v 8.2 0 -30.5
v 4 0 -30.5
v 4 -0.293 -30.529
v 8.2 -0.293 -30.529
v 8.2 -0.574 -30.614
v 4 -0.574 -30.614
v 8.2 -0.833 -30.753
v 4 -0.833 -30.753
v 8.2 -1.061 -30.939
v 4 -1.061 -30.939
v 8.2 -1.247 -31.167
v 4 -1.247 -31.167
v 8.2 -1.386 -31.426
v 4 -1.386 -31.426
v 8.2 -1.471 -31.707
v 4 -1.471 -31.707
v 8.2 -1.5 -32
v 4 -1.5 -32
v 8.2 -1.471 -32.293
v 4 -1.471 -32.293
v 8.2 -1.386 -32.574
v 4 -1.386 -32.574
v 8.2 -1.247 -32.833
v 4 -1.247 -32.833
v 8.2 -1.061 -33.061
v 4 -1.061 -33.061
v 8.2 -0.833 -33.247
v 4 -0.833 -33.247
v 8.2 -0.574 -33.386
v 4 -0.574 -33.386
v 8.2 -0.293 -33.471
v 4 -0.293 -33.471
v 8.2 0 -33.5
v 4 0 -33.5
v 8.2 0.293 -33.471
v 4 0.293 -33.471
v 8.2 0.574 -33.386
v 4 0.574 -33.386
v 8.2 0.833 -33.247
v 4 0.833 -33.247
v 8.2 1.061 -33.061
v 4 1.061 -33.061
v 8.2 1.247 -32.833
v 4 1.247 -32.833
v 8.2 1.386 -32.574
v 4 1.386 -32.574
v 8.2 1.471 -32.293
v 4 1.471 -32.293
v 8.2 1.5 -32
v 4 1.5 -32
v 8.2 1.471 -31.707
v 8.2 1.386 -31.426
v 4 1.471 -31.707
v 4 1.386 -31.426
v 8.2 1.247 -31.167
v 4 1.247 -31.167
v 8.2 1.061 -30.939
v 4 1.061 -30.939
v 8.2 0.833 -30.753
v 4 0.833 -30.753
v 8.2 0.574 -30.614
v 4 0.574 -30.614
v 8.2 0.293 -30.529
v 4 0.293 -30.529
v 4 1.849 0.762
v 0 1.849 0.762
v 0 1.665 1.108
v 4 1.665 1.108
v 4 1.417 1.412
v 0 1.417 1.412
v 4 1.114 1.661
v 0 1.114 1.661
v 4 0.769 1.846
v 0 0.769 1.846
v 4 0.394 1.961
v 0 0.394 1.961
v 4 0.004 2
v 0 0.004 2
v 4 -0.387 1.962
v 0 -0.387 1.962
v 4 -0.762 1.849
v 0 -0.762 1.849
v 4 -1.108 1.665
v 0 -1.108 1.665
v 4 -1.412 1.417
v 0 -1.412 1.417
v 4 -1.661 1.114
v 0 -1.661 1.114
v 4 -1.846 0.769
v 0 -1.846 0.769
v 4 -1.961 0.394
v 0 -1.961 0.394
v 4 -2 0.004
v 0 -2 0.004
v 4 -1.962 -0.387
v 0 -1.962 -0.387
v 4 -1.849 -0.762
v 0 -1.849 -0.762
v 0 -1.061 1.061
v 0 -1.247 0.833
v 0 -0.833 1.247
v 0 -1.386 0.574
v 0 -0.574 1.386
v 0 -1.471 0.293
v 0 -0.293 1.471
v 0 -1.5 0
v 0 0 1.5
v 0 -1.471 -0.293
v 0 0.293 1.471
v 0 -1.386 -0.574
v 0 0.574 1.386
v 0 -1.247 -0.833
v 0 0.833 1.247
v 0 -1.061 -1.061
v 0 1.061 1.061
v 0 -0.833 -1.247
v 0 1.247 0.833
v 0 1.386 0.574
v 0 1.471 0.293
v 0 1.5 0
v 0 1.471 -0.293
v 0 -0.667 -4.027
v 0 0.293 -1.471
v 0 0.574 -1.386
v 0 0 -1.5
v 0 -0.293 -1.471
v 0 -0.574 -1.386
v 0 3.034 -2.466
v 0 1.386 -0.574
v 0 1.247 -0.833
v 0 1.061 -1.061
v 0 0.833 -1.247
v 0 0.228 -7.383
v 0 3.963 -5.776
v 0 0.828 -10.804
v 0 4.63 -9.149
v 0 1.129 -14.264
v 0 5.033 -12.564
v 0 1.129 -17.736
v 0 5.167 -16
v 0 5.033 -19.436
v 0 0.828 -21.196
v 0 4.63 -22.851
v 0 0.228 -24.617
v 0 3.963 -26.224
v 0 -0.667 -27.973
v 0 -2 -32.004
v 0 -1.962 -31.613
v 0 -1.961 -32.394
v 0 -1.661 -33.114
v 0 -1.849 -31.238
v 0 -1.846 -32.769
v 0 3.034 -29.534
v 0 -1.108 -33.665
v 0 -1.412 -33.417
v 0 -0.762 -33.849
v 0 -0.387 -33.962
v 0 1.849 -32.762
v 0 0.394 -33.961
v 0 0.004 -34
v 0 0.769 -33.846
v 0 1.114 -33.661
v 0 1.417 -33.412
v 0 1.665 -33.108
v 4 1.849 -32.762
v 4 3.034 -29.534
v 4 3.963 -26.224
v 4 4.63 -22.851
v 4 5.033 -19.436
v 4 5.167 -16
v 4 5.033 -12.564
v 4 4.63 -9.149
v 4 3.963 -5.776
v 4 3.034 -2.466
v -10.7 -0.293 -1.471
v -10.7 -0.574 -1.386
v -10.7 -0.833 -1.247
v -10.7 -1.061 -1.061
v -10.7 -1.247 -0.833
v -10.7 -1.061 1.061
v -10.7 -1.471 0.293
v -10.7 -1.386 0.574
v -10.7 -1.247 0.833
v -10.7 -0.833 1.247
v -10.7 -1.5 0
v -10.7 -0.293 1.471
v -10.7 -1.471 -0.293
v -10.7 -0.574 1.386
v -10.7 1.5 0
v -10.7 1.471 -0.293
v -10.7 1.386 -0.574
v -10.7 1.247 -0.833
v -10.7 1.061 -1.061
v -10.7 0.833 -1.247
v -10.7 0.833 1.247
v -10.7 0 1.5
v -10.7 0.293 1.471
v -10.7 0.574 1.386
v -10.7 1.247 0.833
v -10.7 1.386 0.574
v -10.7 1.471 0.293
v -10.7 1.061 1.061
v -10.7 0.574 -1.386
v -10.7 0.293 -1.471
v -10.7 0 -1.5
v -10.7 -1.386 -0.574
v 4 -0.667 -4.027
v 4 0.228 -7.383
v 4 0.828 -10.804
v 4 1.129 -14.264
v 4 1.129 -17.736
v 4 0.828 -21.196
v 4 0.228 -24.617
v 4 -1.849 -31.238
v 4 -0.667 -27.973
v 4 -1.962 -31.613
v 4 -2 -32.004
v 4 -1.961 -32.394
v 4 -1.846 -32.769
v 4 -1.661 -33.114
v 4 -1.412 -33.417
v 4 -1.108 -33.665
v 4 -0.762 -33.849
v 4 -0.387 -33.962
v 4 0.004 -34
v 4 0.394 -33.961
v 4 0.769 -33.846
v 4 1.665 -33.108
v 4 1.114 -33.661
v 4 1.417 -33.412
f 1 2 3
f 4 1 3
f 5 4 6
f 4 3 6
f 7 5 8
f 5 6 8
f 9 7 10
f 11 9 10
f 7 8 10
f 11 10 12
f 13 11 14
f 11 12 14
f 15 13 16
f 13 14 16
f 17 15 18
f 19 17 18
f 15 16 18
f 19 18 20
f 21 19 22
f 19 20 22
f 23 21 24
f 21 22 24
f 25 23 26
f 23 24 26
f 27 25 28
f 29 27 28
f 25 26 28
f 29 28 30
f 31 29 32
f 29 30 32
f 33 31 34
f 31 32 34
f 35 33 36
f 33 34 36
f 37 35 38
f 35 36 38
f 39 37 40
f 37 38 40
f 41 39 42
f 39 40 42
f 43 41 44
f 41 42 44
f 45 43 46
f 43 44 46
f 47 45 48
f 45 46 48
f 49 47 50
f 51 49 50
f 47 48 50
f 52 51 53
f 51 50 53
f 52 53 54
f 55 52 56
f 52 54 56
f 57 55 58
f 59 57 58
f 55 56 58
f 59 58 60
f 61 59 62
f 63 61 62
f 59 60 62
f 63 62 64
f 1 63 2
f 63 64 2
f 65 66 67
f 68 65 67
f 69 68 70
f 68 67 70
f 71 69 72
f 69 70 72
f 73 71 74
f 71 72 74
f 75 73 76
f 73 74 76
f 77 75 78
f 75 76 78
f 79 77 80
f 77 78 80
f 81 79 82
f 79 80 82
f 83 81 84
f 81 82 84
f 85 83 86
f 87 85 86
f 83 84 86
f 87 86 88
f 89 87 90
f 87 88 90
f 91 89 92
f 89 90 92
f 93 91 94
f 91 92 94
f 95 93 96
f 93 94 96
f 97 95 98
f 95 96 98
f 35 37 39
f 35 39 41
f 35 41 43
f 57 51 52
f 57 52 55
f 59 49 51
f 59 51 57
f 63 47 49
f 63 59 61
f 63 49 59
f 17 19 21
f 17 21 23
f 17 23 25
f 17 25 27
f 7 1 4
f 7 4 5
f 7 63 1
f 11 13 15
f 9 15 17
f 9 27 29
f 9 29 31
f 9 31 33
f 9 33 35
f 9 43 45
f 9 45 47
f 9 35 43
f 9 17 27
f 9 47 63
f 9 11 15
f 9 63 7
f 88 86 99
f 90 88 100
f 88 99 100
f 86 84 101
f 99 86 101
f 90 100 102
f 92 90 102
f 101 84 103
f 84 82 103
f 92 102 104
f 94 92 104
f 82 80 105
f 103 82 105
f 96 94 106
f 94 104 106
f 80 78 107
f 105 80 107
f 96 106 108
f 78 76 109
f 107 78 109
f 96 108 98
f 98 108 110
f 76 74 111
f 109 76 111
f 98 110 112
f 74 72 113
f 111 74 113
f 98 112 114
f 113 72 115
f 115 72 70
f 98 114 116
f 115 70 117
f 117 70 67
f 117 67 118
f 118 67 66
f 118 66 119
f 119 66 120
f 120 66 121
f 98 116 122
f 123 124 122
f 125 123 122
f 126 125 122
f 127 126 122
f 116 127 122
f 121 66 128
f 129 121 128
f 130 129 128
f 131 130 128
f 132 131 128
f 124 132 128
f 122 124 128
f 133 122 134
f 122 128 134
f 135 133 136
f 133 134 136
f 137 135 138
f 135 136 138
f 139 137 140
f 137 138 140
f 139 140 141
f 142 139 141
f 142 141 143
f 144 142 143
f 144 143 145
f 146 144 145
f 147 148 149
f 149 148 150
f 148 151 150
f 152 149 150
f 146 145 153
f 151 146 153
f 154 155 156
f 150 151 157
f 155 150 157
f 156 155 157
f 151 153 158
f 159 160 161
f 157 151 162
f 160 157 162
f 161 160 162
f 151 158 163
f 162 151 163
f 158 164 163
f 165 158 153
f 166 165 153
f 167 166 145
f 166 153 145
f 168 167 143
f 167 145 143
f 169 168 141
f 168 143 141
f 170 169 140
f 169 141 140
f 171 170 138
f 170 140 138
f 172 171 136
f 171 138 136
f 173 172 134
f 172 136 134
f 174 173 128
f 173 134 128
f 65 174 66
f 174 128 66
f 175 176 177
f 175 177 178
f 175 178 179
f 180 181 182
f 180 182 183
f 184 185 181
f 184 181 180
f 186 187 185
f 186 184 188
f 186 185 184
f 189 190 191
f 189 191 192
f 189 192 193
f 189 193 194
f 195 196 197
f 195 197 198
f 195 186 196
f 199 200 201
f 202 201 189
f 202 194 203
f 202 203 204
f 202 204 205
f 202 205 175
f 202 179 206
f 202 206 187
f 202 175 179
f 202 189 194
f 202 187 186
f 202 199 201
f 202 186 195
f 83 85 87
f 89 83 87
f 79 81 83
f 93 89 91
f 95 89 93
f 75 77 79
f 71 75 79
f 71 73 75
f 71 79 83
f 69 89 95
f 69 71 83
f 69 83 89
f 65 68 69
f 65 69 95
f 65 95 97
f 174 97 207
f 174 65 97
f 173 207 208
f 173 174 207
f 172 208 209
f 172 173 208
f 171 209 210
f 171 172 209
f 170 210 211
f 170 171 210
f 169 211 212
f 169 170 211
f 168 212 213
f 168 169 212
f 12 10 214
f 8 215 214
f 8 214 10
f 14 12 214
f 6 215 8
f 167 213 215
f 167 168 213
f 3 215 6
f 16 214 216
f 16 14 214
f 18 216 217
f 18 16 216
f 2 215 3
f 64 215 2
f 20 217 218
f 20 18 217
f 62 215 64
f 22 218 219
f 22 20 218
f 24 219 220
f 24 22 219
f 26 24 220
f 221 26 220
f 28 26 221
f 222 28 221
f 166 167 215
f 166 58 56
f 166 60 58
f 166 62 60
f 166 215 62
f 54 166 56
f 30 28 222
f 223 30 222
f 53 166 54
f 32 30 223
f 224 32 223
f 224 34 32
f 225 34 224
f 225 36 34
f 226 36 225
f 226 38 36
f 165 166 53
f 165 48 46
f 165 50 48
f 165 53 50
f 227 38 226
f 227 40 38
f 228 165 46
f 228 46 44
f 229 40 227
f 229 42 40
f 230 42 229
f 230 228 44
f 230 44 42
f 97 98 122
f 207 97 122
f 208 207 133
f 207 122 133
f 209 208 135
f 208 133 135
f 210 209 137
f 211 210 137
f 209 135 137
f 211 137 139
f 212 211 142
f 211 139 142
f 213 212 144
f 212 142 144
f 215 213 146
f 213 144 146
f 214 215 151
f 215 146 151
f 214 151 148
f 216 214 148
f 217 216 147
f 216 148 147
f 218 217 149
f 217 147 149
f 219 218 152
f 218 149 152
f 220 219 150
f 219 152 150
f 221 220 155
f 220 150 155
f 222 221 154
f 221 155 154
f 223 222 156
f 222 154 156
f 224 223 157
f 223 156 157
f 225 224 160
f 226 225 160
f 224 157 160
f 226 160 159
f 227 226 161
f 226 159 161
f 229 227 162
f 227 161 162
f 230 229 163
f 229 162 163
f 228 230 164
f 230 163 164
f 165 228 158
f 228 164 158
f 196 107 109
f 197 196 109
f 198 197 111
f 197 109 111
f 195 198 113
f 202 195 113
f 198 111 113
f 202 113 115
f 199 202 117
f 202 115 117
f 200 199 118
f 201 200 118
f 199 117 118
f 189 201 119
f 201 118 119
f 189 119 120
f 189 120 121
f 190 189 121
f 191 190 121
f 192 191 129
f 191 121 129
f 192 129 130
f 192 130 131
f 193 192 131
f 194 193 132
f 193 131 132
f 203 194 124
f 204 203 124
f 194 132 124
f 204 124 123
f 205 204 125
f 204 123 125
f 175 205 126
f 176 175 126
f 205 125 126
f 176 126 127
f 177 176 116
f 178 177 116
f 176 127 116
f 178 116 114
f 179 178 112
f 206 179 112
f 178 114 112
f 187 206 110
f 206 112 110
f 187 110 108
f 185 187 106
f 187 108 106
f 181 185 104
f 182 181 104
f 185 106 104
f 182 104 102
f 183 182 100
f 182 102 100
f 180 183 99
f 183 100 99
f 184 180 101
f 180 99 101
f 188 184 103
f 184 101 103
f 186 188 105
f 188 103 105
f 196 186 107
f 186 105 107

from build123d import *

# Parameters (mm, degrees)
BOSS_EXTRUDE1_DEPTH = 4
SKETCH2_R           = 1.5
BOSS_EXTRUDE2_DEPTH = 4.2
SKETCH3_R           = 1.5
BOSS_EXTRUDE3_DEPTH = 10.7


with BuildPart() as part:
    # Sketch1 → Boss-Extrude1 (new body)
    with BuildSketch(Plane(origin=(0, 0, 0), x_dir=(0, 0, -1), z_dir=(1, 0, 0))):
        with BuildLine():
            ThreePointArc((-0.761904762, 1.849189318), (-1.849189318, -0.761904762), (0.761904762, -1.849189318))
            ThreePointArc((0.761904762, -1.849189318), (16, 1.167024322), (31.238095238, -1.849189318))
            ThreePointArc((31.238095238, -1.849189318), (33.849189318, -0.761904762), (32.761904762, 1.849189318))
            ThreePointArc((32.761904762, 1.849189318), (16, 5.167024322), (-0.761904762, 1.849189318))
        make_face()
    extrude(amount=BOSS_EXTRUDE1_DEPTH)

    # Sketch2 → Boss-Extrude2 (add)
    with BuildSketch(Plane(origin=(4, 0, 0), x_dir=(0, 0, -1), z_dir=(1, 0, 0))):
        with Locations(Location((32, 0, 0), (0, 0, 180))):
            Circle(SKETCH2_R)
    extrude(amount=BOSS_EXTRUDE2_DEPTH)

    # Sketch3 → Boss-Extrude3 (add)
    with BuildSketch(Plane.ZY):
        Circle(SKETCH3_R)
    extrude(amount=BOSS_EXTRUDE3_DEPTH)


solid = part.part
